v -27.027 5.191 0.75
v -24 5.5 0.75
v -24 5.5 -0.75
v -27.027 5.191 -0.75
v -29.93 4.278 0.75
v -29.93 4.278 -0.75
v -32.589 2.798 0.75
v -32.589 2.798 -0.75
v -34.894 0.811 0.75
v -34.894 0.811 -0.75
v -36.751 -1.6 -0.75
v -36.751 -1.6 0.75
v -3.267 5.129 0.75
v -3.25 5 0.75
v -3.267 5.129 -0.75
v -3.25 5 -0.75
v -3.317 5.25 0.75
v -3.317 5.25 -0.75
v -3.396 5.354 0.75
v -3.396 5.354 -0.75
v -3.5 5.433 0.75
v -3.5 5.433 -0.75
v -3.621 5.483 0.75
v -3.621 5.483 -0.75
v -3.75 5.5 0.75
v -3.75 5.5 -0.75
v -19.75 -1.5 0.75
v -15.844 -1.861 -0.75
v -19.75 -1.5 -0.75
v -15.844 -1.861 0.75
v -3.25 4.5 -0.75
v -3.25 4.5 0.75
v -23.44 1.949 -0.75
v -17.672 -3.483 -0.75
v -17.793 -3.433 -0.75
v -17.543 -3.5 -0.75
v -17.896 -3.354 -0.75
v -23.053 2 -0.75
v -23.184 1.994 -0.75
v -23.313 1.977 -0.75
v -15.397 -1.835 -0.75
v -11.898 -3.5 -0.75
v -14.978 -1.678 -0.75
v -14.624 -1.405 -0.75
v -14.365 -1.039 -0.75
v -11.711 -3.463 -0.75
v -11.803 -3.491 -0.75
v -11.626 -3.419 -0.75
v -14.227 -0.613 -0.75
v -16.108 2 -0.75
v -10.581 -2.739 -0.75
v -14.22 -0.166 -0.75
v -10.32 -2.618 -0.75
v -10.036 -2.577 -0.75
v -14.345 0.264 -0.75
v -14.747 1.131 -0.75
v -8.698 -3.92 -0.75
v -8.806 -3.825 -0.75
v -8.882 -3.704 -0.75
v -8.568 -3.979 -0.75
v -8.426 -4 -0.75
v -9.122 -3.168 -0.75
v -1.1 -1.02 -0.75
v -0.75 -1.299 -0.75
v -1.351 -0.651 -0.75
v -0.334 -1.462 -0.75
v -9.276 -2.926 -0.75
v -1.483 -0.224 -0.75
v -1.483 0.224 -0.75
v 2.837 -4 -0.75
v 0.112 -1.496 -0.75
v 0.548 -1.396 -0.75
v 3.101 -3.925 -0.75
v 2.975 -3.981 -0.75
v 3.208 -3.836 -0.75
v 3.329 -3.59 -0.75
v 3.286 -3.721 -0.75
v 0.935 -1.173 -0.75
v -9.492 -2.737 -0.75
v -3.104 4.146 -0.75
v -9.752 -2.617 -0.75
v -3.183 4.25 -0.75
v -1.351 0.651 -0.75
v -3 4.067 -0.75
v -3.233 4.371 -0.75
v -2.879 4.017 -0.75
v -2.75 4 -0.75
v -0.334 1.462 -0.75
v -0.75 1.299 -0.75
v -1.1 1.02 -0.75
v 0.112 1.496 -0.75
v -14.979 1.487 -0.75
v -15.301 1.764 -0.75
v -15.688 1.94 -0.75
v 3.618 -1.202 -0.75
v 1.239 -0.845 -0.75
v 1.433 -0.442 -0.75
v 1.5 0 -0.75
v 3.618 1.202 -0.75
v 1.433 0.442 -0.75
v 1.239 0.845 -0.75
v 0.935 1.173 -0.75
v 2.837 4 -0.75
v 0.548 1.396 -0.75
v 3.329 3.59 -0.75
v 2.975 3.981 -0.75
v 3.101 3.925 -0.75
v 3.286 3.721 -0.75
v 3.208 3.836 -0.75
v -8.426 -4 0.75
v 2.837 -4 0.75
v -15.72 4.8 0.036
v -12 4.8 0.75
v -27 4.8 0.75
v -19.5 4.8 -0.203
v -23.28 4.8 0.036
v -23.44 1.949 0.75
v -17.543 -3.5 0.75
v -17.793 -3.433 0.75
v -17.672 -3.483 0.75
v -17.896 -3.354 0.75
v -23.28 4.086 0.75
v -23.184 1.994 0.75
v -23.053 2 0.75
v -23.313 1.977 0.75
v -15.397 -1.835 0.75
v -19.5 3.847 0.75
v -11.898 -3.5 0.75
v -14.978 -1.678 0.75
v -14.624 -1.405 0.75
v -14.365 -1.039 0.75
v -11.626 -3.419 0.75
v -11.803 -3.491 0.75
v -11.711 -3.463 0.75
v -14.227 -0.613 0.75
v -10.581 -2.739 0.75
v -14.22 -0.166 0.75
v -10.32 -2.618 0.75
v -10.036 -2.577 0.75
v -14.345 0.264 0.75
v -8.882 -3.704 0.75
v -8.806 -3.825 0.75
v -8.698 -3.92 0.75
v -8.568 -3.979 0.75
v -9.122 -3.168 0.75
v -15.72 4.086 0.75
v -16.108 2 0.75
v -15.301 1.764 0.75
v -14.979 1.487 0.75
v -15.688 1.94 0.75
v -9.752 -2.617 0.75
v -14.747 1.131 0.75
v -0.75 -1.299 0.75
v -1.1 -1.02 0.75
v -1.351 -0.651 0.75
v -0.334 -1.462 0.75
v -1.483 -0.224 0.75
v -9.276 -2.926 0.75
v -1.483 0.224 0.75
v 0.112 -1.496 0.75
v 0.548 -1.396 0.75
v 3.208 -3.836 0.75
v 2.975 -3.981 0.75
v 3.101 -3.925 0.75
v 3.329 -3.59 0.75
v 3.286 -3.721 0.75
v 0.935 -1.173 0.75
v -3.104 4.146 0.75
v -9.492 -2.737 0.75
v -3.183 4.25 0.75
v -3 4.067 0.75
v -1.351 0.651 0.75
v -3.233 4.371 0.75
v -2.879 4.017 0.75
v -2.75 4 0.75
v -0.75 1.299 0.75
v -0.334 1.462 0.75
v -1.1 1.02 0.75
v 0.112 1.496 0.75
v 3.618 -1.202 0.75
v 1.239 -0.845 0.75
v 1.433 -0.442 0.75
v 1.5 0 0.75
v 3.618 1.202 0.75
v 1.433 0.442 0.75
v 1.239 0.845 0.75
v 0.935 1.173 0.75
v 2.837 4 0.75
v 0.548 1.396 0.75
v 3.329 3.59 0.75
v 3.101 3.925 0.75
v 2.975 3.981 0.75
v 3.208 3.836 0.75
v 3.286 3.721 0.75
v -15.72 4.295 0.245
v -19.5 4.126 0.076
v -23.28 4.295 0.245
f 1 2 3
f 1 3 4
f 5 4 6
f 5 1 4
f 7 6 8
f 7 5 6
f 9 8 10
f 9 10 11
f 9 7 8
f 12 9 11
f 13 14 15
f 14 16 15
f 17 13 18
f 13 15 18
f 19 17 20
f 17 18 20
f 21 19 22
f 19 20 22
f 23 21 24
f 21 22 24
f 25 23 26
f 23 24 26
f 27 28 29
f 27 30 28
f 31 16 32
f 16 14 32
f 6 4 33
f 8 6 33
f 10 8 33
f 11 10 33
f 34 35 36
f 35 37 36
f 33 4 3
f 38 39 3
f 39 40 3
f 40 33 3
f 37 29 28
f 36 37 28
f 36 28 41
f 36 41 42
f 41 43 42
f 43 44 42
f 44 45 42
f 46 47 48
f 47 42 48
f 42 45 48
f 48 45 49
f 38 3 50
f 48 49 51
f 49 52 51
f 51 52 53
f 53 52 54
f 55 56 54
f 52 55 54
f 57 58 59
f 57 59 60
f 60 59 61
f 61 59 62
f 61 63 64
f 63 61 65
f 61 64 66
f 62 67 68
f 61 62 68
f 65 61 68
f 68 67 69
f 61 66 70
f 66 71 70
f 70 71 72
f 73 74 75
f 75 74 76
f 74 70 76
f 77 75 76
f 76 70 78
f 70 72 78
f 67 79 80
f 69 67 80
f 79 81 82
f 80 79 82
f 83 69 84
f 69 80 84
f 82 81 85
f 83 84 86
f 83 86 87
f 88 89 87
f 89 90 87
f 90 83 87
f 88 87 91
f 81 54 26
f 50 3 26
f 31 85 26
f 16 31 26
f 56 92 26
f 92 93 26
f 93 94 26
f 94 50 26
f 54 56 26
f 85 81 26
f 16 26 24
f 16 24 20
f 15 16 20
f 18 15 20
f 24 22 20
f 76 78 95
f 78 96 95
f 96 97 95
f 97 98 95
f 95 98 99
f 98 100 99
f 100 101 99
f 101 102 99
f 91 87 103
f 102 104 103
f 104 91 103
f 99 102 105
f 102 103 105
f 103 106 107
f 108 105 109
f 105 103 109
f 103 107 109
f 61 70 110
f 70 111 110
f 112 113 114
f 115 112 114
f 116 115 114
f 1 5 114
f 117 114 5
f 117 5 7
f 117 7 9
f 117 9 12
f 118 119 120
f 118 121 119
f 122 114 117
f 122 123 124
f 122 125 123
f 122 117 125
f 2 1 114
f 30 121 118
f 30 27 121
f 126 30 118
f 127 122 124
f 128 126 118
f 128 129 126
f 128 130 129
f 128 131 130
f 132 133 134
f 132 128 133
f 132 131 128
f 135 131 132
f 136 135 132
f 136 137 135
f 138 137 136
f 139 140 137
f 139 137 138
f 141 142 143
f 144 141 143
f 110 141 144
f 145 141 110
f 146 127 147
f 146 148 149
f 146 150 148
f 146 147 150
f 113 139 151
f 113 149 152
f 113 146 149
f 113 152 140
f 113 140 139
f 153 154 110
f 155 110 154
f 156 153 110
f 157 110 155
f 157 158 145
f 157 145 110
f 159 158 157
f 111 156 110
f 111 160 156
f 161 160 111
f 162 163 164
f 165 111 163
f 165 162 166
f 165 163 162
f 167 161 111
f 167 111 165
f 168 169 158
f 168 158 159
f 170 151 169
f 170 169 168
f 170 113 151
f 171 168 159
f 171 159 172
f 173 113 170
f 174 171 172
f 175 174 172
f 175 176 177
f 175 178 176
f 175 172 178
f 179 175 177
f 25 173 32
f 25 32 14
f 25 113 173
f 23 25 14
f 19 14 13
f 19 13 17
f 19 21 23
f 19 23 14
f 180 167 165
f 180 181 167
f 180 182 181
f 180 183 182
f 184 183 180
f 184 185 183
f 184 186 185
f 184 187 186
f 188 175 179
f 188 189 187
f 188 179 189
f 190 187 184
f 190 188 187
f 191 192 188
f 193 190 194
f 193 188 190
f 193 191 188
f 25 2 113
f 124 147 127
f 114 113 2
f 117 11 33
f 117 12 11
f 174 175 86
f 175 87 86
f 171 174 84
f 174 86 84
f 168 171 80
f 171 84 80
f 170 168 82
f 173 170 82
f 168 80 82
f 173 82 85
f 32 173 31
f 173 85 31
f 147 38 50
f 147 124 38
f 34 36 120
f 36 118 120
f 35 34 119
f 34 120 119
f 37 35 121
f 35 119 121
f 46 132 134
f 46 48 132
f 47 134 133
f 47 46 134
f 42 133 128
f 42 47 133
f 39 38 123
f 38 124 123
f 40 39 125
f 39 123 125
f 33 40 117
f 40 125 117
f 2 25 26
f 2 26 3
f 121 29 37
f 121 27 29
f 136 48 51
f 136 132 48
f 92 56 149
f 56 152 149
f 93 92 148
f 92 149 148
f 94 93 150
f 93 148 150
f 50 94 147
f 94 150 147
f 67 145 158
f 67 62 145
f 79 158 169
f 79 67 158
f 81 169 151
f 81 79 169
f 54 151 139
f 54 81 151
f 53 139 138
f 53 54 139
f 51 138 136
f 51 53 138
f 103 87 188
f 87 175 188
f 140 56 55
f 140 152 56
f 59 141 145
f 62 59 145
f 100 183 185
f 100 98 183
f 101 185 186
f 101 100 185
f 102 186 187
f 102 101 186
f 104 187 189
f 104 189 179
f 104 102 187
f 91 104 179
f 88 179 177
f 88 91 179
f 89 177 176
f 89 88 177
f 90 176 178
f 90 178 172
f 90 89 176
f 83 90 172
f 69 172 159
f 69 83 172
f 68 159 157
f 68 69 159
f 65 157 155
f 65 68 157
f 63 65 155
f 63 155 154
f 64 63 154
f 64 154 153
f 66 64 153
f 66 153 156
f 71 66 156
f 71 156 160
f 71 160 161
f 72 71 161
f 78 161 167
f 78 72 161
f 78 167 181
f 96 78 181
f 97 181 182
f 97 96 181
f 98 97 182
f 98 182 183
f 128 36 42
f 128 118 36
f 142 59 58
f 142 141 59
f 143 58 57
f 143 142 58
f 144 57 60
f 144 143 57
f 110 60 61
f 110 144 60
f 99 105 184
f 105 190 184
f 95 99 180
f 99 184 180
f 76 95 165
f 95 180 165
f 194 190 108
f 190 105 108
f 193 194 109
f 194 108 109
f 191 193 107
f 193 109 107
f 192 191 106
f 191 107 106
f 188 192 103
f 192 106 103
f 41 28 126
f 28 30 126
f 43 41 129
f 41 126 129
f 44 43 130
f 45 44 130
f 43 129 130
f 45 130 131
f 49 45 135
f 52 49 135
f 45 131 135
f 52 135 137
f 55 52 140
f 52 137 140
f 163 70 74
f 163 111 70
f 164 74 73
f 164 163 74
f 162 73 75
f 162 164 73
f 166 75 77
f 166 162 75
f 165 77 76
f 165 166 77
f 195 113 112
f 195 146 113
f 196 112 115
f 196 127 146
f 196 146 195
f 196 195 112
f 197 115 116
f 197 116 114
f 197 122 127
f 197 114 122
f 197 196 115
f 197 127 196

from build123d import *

# Parameters (mm, degrees)
SKETCH1_R           = 1.5
BOSS_EXTRUDE1_DEPTH = 0.75
BOSS_EXTRUDE2_DEPTH = 0.75
FILLET1_R           = 1
FILLET2_R           = 0.5
FILLET3_R           = 1.5
CUT_REVOLVE1_ANGLE  = 90


with BuildPart() as part:
    # Sketch1 → Boss-Extrude1 (new, symmetric)
    with BuildSketch(Plane.XY):
        with BuildLine():
            Line((-13, 5.5), (-3.25, 5.5))
            Line((-3.25, 5.5), (-3.25, 4))
            Line((-3.25, 4), (3.25, 4))
            ThreePointArc((3.25, 4), (3.654082058, 0), (3.25, -4))
            Line((3.25, -4), (-8.75, -4))
            Line((-8.75, -4), (-13, 5.5))
        make_face()
        Circle(SKETCH1_R, mode=Mode.SUBTRACT)
    extrude(amount=BOSS_EXTRUDE1_DEPTH, both=True)

    # Sketch7 → Boss-Extrude2 (add, symmetric)
    with BuildSketch(Plane.XY):
        with BuildLine():
            Line((-13, 5.5), (-24, 5.5))
            ThreePointArc((-24, 5.5), (-31.29725976, 3.605342422), (-36.751078386, -1.6))
            Line((-36.751078386, -1.6), (-23.25, 2))
            Line((-23.25, 2), (-15.15, 2))
            Line((-15.15, 2), (-13.25, -2.1))
            Line((-13.25, -2.1), (-19.75, -1.5))
            Line((-19.75, -1.5), (-17.75, -3.5))
            Line((-17.75, -3.5), (-11.75, -3.5))
            Line((-11.75, -3.5), (-9.6, -2.1))
            Line((-9.6, -2.1), (-13, 5.5))
        make_face()
    extrude(amount=BOSS_EXTRUDE2_DEPTH, both=True)

    # Fillet1
    fillet1_edges = [part.edges().sort_by_distance(p)[0] for p in [
        (-9.6, -2.1, 0),
    ]]
    fillet(fillet1_edges, radius=FILLET1_R)

    # Fillet2
    fillet2_edges = [part.edges().sort_by_distance(p)[0] for p in [
        (-3.25, 4, 0),
        (3.25, 4, 0),
        (3.25, -4, 0),
        (-8.75, -4, 0),
        (-3.25, 5.5, 0),
        (-17.75, -3.5, 0),
        (-11.75, -3.5, 0),
    ]]
    fillet(fillet2_edges, radius=FILLET2_R)

    # Fillet3
    fillet3_edges = [part.edges().sort_by_distance(p)[0] for p in [
        (-23.25, 2, 0),
        (-15.15, 2, 0),
        (-13.25, -2.1, 0),
    ]]
    fillet(fillet3_edges, radius=FILLET3_R)

    # Sketch6 → Cut-Revolve1 (revolve, cut)
    with BuildSketch(Plane.XY.offset(0.75)):
        with BuildLine():
            Line((-27, 4.8), (-12, 4.8))
            ThreePointArc((-12, 4.8), (-19.5, 3.847375097), (-27, 4.8))
        make_face()
    revolve(axis=Axis((-27, 4.8, 0.75), (1, 0, 0)), revolution_arc=CUT_REVOLVE1_ANGLE, mode=Mode.SUBTRACT)


solid = part.part
